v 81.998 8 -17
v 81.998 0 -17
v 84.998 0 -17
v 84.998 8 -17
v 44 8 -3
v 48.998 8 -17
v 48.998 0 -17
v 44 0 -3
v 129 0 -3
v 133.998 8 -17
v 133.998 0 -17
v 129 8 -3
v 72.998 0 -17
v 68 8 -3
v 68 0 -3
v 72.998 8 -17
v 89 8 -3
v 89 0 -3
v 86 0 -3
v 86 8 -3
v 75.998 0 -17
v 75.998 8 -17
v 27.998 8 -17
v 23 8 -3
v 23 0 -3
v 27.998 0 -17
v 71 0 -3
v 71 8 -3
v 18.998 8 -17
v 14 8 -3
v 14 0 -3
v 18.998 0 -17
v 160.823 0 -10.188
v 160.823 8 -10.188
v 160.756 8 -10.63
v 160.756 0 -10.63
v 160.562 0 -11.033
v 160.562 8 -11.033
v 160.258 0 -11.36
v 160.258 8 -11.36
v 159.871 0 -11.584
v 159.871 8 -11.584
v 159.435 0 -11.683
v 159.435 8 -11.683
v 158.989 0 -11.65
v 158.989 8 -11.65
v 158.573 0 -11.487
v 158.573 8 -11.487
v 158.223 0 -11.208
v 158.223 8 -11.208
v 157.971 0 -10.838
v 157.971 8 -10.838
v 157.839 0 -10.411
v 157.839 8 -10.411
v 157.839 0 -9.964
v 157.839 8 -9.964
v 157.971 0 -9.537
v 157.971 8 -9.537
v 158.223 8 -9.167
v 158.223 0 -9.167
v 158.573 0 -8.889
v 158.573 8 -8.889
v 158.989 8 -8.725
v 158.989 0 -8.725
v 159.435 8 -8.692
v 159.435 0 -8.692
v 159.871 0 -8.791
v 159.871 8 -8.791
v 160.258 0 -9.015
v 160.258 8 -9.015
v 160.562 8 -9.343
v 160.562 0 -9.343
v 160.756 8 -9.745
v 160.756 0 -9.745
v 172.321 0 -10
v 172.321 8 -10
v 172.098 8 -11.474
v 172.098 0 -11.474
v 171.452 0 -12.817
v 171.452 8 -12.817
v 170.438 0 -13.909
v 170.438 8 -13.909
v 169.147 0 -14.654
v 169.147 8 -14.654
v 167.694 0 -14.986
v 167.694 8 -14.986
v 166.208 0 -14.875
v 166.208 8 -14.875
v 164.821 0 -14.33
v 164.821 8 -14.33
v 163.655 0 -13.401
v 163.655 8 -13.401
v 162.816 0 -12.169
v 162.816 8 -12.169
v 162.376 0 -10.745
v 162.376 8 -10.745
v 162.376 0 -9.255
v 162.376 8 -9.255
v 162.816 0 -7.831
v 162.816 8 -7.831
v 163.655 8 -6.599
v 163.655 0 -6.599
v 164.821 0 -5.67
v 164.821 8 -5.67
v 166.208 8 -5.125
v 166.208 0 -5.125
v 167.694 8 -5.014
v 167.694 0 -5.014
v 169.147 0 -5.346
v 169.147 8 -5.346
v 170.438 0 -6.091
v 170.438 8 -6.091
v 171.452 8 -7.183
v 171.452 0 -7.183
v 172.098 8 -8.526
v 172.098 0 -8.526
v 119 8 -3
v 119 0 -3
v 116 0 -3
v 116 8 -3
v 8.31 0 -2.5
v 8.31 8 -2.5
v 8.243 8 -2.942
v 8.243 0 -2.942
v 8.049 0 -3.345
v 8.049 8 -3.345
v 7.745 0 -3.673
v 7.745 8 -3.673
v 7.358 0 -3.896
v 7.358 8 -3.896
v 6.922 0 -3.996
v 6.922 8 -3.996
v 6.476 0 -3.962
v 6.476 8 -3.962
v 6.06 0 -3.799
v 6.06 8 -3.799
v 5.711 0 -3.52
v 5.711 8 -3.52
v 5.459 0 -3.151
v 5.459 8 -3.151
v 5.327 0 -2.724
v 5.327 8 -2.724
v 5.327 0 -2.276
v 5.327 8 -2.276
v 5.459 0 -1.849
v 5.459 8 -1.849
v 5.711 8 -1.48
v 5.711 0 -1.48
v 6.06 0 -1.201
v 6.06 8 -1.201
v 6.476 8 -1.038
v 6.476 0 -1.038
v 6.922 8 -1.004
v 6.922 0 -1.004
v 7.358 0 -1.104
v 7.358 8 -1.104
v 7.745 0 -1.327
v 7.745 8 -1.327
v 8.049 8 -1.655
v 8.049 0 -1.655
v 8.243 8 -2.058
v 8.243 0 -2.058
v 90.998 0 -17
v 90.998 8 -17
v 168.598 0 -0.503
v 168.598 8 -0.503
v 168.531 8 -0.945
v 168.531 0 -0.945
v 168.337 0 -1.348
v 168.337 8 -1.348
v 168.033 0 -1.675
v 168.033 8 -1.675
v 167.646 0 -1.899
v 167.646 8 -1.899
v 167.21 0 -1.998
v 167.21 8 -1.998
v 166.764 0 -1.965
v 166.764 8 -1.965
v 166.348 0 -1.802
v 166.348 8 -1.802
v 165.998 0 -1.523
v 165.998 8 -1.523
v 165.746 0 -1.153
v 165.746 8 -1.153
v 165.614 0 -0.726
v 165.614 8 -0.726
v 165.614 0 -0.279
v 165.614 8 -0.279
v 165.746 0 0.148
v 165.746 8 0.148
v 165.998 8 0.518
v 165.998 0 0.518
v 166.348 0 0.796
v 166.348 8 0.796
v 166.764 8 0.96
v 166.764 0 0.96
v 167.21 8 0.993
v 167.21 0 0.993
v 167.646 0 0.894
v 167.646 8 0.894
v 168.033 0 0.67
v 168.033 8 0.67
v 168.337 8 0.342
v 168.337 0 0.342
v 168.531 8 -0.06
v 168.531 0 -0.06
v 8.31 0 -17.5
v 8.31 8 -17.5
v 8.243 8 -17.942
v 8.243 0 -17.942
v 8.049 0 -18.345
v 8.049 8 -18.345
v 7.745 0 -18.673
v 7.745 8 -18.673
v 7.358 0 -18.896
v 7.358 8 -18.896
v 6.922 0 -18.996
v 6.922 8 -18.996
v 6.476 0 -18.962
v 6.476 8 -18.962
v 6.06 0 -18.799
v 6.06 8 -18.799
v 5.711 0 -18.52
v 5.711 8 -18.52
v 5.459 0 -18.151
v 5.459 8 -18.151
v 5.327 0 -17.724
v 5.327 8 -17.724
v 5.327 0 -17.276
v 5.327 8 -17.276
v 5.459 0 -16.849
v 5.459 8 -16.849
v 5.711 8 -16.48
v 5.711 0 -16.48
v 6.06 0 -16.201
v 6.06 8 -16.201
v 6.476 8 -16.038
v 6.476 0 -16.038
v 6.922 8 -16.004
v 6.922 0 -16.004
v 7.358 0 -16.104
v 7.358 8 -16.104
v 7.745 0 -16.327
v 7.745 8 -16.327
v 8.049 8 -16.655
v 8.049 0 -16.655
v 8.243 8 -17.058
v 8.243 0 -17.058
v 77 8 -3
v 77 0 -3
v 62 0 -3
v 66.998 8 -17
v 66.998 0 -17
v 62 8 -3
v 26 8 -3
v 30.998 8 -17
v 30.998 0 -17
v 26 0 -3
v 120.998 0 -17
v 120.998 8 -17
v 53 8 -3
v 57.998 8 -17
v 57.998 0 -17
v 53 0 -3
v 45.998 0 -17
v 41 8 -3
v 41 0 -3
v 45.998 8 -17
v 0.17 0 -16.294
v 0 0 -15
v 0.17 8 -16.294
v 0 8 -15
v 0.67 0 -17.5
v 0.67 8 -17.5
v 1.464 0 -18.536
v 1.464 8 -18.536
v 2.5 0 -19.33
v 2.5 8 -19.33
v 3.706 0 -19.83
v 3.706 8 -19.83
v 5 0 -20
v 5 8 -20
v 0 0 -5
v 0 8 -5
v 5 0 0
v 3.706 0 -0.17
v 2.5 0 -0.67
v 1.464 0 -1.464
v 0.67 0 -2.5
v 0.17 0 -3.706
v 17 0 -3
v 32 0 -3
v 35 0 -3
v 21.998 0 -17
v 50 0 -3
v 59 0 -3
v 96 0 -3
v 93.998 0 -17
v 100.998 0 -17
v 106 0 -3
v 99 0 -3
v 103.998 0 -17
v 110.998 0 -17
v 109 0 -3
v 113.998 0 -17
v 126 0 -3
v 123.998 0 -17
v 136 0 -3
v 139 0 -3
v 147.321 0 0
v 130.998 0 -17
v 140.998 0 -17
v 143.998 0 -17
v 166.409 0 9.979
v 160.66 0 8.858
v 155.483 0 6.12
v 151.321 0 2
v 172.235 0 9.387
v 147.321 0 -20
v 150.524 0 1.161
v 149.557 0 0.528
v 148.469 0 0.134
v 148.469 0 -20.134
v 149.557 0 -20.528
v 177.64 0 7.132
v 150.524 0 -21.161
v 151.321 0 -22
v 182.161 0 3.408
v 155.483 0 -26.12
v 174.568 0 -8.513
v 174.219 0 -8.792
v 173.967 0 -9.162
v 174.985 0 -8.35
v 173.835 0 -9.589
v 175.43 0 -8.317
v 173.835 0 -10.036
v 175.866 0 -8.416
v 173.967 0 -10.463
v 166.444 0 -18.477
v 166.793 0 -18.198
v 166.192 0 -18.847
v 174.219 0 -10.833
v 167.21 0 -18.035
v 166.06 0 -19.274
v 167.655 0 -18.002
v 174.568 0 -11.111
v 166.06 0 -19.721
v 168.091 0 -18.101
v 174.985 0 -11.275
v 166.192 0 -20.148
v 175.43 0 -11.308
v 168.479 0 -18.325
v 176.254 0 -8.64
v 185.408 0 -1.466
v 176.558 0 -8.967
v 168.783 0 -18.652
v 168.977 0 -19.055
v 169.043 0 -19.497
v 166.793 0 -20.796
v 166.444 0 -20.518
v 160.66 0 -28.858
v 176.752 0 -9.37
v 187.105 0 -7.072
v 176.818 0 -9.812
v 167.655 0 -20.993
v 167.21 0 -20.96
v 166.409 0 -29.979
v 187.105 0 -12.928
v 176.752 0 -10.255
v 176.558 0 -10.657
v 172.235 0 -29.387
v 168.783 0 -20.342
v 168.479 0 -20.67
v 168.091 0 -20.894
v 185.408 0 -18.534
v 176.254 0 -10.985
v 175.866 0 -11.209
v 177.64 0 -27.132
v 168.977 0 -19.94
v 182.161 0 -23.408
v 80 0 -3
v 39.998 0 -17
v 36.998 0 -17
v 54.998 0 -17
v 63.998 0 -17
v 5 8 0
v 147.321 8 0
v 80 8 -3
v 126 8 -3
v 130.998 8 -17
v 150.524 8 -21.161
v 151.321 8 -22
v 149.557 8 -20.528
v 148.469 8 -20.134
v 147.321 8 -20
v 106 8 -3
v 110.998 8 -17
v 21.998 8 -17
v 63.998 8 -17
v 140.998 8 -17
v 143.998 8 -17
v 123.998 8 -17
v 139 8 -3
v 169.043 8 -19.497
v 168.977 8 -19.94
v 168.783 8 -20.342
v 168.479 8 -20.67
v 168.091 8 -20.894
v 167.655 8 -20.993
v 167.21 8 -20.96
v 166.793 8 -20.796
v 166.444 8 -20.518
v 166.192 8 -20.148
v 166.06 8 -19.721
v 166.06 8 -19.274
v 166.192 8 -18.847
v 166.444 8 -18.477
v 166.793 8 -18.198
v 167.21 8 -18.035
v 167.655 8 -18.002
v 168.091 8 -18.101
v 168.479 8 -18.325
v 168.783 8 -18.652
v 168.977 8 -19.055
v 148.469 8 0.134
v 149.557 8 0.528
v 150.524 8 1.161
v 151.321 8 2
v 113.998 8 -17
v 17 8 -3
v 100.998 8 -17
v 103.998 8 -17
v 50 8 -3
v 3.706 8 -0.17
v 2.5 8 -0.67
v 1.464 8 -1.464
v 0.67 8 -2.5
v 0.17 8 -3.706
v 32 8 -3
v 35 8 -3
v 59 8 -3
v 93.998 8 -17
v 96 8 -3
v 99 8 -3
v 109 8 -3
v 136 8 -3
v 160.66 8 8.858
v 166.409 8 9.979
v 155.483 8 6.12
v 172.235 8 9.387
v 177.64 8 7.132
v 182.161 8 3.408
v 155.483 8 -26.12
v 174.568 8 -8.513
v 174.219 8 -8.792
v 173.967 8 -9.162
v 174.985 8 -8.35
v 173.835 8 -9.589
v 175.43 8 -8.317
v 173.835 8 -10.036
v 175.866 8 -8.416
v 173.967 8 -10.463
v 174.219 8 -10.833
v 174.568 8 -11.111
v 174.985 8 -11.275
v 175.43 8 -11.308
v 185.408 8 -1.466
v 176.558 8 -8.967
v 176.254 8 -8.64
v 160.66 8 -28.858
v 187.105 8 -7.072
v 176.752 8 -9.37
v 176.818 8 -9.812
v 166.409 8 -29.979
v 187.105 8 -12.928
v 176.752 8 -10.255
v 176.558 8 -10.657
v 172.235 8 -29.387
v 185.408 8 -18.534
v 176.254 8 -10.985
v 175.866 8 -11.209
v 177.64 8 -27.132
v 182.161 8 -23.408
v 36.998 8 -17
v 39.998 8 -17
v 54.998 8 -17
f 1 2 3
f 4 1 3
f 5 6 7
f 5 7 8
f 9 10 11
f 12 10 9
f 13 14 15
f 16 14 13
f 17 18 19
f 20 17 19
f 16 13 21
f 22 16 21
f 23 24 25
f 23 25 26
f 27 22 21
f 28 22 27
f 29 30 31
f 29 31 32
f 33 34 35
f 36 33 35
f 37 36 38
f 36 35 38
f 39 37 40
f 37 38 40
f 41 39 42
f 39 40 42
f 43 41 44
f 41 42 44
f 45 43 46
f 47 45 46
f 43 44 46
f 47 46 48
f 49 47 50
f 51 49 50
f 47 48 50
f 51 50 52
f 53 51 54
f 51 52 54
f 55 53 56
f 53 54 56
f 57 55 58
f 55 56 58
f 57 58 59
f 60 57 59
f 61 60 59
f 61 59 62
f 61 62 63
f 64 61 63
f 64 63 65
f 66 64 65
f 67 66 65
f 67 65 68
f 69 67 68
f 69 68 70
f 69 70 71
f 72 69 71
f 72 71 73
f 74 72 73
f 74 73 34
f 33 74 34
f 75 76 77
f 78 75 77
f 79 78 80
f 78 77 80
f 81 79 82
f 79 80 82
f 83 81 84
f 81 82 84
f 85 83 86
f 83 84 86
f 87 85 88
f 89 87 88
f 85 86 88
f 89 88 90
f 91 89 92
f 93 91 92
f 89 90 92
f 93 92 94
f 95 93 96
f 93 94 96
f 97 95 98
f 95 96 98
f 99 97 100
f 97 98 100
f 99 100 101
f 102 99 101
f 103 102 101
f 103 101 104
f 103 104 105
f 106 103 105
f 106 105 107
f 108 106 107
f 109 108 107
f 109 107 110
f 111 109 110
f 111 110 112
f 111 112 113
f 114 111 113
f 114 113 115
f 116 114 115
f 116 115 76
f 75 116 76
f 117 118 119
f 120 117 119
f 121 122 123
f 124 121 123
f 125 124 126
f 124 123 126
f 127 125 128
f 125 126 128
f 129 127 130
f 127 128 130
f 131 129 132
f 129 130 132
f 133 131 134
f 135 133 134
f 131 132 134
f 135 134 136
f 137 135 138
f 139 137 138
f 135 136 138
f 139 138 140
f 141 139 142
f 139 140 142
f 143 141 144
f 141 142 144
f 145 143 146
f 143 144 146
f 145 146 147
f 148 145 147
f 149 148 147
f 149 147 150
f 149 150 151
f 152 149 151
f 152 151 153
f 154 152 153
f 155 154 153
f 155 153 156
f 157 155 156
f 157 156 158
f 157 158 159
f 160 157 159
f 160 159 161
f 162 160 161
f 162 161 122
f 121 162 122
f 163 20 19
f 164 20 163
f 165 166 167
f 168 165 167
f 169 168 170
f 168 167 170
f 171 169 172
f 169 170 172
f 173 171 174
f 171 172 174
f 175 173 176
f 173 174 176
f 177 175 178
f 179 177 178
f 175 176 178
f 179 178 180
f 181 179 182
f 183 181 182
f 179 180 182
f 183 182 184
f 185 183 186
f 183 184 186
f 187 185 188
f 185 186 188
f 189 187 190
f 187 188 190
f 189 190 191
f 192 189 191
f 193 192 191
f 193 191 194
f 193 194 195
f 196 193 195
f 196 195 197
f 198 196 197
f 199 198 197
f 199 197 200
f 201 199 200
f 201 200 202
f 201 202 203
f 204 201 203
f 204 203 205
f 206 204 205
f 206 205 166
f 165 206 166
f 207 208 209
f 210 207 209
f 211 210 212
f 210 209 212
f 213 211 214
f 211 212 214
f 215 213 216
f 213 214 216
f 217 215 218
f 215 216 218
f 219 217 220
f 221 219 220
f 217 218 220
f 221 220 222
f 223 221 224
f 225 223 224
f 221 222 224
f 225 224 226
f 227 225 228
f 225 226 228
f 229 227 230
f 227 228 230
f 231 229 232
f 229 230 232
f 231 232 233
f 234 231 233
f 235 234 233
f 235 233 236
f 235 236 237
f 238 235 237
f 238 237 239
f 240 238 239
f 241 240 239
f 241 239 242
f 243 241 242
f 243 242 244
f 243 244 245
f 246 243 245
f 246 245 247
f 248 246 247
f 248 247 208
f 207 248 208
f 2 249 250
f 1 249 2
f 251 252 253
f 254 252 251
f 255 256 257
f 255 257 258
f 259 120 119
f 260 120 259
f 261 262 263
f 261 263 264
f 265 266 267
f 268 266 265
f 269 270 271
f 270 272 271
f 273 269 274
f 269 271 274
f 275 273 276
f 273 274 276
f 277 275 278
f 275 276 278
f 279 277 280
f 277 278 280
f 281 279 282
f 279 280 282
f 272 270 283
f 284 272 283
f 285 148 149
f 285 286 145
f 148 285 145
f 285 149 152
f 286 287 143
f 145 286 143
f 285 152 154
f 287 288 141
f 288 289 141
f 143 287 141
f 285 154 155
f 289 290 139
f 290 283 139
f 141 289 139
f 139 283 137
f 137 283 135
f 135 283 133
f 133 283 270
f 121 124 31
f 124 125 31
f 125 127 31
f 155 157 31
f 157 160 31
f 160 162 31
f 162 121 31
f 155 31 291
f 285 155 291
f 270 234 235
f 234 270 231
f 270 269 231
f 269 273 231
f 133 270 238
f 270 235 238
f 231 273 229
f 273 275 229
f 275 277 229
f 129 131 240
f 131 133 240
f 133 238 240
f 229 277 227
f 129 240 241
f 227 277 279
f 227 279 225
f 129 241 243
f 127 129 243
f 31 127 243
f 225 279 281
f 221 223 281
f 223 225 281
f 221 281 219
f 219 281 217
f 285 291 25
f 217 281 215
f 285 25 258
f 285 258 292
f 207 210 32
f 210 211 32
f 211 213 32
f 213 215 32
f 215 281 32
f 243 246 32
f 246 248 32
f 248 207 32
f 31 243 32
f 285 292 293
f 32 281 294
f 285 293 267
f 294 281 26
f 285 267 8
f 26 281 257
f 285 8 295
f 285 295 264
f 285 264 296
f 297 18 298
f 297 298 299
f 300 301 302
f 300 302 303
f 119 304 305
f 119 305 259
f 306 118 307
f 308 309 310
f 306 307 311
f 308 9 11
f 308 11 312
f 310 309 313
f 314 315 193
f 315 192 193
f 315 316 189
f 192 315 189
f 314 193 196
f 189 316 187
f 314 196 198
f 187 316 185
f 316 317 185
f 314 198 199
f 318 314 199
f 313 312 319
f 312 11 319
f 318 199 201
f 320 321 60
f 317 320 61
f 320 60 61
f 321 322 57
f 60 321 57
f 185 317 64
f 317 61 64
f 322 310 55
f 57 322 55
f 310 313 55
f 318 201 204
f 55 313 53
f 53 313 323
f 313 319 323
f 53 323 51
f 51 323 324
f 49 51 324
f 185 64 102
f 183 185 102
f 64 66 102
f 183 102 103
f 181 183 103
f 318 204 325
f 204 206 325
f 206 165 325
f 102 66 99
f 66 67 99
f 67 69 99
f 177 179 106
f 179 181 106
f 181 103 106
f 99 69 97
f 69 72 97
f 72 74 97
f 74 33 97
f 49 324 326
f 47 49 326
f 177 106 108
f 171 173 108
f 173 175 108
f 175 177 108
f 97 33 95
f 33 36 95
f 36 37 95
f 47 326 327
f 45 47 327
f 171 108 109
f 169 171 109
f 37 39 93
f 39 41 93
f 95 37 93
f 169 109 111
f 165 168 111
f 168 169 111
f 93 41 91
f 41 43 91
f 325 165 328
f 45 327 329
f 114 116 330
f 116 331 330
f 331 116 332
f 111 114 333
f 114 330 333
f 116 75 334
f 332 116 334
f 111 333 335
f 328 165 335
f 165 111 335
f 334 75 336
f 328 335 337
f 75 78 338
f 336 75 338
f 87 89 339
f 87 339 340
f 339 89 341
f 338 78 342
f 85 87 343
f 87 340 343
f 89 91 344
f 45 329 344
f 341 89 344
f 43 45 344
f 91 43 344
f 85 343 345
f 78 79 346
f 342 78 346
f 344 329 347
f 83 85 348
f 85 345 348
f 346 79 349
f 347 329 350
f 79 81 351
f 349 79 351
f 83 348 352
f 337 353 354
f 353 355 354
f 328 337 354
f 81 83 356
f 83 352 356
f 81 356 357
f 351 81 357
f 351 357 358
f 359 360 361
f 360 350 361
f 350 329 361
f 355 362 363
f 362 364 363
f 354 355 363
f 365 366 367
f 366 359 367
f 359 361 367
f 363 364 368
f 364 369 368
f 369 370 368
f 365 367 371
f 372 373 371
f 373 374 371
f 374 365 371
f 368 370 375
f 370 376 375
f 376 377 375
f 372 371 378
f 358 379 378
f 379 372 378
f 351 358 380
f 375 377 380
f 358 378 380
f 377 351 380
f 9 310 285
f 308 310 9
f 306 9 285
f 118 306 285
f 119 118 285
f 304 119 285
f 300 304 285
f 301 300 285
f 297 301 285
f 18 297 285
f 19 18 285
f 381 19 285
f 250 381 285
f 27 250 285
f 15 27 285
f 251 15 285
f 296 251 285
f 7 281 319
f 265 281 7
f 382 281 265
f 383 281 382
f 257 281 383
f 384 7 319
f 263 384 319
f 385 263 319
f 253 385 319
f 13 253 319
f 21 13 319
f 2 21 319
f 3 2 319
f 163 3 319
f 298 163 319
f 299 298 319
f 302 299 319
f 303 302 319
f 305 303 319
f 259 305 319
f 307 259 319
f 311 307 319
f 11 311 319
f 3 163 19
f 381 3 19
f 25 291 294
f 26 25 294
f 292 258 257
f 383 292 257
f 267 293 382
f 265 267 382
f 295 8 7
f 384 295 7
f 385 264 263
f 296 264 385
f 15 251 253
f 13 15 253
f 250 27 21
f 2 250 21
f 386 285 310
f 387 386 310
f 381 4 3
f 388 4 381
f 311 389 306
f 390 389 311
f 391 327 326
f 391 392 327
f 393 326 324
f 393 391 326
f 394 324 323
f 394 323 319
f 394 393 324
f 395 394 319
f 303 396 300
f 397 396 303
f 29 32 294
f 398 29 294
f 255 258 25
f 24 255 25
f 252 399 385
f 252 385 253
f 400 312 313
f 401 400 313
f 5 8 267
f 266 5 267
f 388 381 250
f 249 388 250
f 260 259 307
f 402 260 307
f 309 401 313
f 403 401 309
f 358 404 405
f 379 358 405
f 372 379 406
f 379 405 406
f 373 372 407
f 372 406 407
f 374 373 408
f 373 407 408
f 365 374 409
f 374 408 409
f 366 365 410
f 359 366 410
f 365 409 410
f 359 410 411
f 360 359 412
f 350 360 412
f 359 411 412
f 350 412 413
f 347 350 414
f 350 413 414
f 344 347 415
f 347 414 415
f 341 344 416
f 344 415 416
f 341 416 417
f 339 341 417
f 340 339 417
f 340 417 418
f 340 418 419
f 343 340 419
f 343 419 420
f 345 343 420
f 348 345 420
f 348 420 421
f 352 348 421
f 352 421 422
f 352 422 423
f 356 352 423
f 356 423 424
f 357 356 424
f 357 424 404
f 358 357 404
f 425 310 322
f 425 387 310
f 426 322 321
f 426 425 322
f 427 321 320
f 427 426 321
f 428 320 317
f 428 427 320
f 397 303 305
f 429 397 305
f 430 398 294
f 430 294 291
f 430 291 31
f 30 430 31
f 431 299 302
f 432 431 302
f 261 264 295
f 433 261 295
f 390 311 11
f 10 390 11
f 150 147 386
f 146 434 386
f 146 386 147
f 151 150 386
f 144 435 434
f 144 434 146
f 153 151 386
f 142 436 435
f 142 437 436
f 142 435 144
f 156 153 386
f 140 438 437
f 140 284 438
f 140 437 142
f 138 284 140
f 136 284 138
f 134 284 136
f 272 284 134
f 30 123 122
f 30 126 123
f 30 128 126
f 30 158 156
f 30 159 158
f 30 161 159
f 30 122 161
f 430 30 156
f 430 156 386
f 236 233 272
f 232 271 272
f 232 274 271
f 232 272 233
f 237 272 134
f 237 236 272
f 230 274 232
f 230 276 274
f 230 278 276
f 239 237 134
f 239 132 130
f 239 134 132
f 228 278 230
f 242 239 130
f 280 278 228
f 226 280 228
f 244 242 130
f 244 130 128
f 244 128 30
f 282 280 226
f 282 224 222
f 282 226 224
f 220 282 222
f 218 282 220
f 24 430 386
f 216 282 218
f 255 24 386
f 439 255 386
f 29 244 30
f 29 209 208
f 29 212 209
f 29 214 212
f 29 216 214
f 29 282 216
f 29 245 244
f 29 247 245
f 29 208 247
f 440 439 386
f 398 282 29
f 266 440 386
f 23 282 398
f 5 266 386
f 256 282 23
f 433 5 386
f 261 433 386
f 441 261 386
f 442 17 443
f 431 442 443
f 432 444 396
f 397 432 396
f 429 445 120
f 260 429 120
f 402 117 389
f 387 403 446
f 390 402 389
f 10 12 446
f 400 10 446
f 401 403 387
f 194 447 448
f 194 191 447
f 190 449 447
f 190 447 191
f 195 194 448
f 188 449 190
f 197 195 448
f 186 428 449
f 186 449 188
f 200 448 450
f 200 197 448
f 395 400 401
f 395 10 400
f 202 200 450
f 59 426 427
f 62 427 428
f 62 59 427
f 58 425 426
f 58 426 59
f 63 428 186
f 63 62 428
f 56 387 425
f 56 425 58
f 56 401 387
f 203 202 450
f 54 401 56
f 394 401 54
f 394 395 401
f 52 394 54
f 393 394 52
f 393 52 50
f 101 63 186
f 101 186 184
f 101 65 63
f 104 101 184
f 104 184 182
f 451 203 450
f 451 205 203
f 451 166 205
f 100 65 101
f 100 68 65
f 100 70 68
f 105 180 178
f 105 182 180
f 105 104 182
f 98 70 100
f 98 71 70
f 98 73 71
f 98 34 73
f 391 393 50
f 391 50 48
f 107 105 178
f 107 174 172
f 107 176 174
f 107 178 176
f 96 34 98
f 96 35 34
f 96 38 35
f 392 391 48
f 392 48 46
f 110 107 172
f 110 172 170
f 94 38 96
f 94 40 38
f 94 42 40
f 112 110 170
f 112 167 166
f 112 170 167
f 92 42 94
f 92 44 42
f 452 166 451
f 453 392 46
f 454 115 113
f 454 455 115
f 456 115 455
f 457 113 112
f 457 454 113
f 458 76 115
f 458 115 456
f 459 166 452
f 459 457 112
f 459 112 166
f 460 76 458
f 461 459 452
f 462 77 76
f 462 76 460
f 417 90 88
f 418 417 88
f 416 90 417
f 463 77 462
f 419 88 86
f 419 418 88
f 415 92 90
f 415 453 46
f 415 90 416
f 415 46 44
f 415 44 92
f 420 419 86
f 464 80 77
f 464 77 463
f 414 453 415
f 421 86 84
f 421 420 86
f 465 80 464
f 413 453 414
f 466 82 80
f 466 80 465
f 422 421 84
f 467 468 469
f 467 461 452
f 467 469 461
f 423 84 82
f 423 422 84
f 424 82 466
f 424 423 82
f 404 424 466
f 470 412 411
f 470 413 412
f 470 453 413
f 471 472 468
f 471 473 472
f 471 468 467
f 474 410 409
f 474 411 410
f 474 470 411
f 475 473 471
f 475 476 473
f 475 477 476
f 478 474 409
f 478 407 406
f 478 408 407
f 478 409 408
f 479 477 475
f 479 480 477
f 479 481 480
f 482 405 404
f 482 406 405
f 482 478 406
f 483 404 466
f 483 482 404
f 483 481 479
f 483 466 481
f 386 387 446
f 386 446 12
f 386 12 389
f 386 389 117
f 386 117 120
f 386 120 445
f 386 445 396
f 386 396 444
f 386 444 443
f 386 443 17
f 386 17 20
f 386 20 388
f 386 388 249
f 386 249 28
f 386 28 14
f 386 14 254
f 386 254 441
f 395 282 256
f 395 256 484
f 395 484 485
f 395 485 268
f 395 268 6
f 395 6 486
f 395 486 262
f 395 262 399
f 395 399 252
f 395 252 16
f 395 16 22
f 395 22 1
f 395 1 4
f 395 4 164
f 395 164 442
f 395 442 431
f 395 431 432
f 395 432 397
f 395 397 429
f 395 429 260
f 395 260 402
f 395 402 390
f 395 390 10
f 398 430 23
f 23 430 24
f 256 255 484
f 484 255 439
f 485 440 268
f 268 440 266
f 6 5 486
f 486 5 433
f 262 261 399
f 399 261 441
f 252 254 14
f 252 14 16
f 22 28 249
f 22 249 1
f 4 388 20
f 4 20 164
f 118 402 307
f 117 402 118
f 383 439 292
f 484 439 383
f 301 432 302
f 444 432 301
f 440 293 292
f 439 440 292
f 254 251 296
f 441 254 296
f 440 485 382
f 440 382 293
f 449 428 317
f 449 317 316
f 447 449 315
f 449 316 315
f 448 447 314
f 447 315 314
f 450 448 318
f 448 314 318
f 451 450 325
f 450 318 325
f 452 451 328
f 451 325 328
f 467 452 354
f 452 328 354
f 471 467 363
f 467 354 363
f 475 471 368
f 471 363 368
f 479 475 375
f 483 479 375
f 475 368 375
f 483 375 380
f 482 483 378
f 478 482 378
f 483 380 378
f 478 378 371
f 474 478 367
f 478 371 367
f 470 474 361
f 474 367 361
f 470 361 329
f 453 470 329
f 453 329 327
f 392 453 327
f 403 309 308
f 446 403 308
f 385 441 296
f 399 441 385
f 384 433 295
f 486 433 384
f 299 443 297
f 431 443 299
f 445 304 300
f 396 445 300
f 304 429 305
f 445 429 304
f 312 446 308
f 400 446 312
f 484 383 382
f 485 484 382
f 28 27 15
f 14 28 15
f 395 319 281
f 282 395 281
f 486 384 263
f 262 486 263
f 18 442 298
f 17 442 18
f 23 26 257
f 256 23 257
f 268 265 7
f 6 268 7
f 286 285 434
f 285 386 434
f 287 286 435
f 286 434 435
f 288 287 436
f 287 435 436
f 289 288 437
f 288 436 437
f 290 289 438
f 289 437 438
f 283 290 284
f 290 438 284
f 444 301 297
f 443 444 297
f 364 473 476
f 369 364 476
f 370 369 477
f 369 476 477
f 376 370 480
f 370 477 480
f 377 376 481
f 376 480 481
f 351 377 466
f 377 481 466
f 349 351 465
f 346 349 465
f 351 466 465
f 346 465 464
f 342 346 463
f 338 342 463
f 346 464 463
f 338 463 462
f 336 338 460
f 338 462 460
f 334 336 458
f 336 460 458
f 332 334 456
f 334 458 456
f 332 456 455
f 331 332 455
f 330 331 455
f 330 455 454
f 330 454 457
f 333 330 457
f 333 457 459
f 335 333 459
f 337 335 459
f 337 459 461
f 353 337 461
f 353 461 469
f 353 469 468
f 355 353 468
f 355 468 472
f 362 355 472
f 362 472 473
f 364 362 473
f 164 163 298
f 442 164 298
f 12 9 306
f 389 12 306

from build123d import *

# Parameters (mm, degrees)
BOSS_EXTRUDE1_DEPTH = 8
SKETCH2_R           = 1.5
SKETCH2_R_2         = 5
CUT_EXTRUDE1_DEPTH  = 25
FILLET1_R           = 5
CUT_EXTRUDE2_DEPTH  = 25
SKETCH5_R           = 1.5
CUT_EXTRUDE3_DEPTH  = 25


with BuildPart() as part:
    # Sketch1 → Boss-Extrude1 (new body)
    with BuildSketch(Plane(origin=(0, 0, 0), x_dir=(1, 0, 0), z_dir=(0, 1, 0))):
        with BuildLine():
            Line((0, 0), (150, 0))
            ThreePointArc((150, 0), (187.320508076, 10), (150, 20))
            Line((150, 20), (0, 20))
            Line((0, 20), (0, 0))
        make_face()
    extrude(amount=BOSS_EXTRUDE1_DEPTH)

    # Sketch2 → Cut-Extrude1 (cut)
    with BuildSketch(Plane(origin=(0, 8, 0), x_dir=(1, 0, 0), z_dir=(0, 1, 0))):
        with Locations((167.097723626, 0.502612618)):
            Circle(SKETCH2_R)
        with Locations((167.543292526, 19.497387382)):
            Circle(SKETCH2_R)
        with Locations((175.318307977, 9.812392042)):
            Circle(SKETCH2_R)
        with Locations((159.322708175, 10.187607958)):
            Circle(SKETCH2_R)
        with Locations((167.320508076, 10)):
            Circle(SKETCH2_R_2)
    extrude(amount=-CUT_EXTRUDE1_DEPTH, mode=Mode.SUBTRACT)

    # Fillet1
    fillet1_edges = [part.edges().sort_by_distance(p)[0] for p in [
        (0, 4, -20),
        (150, 4, -20),
        (150, 4, 0),
        (0, 4, 0),
    ]]
    fillet(fillet1_edges, radius=FILLET1_R)

    # Sketch4 → Cut-Extrude2 (cut)
    with BuildSketch(Plane(origin=(0, 8, 0), x_dir=(1, 0, 0), z_dir=(0, 1, 0))):
        Polygon((96, 3), (100.99769729, 17), (103.99769729, 17), (99, 3), align=None)
        Polygon((21.99769729, 17), (17, 3), (14, 3), (18.99769729, 17), align=None)
        Polygon((30.99769729, 17), (26, 3), (23, 3), (27.99769729, 17), align=None)
        Polygon((39.99769729, 17), (35, 3), (32, 3), (36.99769729, 17), align=None)
        Polygon((48.99769729, 17), (44, 3), (41, 3), (45.99769729, 17), align=None)
        Polygon((57.99769729, 17), (53, 3), (50, 3), (54.99769729, 17), align=None)
        Polygon((66.99769729, 17), (62, 3), (59, 3), (63.99769729, 17), align=None)
        Polygon((75.99769729, 17), (71, 3), (68, 3), (72.99769729, 17), align=None)
        Polygon((84.99769729, 17), (80, 3), (77, 3), (81.99769729, 17), align=None)
        Polygon((93.99769729, 17), (89, 3), (86, 3), (90.99769729, 17), align=None)
        Polygon((106, 3), (110.99769729, 17), (113.99769729, 17), (109, 3), align=None)
        Polygon((116, 3), (120.99769729, 17), (123.99769729, 17), (119, 3), align=None)
        Polygon((126, 3), (130.99769729, 17), (133.99769729, 17), (129, 3), align=None)
        Polygon((136, 3), (140.99769729, 17), (143.99769729, 17), (139, 3), align=None)
    extrude(amount=-CUT_EXTRUDE2_DEPTH, mode=Mode.SUBTRACT)

    # Sketch5 → Cut-Extrude3 (cut)
    with BuildSketch(Plane(origin=(0, 8, 0), x_dir=(1, 0, 0), z_dir=(0, 1, 0))):
        with Locations((6.810101414, 17.5)):
            Circle(SKETCH5_R)
        with Locations((6.810101414, 2.5)):
            Circle(SKETCH5_R)
    extrude(amount=-CUT_EXTRUDE3_DEPTH, mode=Mode.SUBTRACT)


solid = part.part
